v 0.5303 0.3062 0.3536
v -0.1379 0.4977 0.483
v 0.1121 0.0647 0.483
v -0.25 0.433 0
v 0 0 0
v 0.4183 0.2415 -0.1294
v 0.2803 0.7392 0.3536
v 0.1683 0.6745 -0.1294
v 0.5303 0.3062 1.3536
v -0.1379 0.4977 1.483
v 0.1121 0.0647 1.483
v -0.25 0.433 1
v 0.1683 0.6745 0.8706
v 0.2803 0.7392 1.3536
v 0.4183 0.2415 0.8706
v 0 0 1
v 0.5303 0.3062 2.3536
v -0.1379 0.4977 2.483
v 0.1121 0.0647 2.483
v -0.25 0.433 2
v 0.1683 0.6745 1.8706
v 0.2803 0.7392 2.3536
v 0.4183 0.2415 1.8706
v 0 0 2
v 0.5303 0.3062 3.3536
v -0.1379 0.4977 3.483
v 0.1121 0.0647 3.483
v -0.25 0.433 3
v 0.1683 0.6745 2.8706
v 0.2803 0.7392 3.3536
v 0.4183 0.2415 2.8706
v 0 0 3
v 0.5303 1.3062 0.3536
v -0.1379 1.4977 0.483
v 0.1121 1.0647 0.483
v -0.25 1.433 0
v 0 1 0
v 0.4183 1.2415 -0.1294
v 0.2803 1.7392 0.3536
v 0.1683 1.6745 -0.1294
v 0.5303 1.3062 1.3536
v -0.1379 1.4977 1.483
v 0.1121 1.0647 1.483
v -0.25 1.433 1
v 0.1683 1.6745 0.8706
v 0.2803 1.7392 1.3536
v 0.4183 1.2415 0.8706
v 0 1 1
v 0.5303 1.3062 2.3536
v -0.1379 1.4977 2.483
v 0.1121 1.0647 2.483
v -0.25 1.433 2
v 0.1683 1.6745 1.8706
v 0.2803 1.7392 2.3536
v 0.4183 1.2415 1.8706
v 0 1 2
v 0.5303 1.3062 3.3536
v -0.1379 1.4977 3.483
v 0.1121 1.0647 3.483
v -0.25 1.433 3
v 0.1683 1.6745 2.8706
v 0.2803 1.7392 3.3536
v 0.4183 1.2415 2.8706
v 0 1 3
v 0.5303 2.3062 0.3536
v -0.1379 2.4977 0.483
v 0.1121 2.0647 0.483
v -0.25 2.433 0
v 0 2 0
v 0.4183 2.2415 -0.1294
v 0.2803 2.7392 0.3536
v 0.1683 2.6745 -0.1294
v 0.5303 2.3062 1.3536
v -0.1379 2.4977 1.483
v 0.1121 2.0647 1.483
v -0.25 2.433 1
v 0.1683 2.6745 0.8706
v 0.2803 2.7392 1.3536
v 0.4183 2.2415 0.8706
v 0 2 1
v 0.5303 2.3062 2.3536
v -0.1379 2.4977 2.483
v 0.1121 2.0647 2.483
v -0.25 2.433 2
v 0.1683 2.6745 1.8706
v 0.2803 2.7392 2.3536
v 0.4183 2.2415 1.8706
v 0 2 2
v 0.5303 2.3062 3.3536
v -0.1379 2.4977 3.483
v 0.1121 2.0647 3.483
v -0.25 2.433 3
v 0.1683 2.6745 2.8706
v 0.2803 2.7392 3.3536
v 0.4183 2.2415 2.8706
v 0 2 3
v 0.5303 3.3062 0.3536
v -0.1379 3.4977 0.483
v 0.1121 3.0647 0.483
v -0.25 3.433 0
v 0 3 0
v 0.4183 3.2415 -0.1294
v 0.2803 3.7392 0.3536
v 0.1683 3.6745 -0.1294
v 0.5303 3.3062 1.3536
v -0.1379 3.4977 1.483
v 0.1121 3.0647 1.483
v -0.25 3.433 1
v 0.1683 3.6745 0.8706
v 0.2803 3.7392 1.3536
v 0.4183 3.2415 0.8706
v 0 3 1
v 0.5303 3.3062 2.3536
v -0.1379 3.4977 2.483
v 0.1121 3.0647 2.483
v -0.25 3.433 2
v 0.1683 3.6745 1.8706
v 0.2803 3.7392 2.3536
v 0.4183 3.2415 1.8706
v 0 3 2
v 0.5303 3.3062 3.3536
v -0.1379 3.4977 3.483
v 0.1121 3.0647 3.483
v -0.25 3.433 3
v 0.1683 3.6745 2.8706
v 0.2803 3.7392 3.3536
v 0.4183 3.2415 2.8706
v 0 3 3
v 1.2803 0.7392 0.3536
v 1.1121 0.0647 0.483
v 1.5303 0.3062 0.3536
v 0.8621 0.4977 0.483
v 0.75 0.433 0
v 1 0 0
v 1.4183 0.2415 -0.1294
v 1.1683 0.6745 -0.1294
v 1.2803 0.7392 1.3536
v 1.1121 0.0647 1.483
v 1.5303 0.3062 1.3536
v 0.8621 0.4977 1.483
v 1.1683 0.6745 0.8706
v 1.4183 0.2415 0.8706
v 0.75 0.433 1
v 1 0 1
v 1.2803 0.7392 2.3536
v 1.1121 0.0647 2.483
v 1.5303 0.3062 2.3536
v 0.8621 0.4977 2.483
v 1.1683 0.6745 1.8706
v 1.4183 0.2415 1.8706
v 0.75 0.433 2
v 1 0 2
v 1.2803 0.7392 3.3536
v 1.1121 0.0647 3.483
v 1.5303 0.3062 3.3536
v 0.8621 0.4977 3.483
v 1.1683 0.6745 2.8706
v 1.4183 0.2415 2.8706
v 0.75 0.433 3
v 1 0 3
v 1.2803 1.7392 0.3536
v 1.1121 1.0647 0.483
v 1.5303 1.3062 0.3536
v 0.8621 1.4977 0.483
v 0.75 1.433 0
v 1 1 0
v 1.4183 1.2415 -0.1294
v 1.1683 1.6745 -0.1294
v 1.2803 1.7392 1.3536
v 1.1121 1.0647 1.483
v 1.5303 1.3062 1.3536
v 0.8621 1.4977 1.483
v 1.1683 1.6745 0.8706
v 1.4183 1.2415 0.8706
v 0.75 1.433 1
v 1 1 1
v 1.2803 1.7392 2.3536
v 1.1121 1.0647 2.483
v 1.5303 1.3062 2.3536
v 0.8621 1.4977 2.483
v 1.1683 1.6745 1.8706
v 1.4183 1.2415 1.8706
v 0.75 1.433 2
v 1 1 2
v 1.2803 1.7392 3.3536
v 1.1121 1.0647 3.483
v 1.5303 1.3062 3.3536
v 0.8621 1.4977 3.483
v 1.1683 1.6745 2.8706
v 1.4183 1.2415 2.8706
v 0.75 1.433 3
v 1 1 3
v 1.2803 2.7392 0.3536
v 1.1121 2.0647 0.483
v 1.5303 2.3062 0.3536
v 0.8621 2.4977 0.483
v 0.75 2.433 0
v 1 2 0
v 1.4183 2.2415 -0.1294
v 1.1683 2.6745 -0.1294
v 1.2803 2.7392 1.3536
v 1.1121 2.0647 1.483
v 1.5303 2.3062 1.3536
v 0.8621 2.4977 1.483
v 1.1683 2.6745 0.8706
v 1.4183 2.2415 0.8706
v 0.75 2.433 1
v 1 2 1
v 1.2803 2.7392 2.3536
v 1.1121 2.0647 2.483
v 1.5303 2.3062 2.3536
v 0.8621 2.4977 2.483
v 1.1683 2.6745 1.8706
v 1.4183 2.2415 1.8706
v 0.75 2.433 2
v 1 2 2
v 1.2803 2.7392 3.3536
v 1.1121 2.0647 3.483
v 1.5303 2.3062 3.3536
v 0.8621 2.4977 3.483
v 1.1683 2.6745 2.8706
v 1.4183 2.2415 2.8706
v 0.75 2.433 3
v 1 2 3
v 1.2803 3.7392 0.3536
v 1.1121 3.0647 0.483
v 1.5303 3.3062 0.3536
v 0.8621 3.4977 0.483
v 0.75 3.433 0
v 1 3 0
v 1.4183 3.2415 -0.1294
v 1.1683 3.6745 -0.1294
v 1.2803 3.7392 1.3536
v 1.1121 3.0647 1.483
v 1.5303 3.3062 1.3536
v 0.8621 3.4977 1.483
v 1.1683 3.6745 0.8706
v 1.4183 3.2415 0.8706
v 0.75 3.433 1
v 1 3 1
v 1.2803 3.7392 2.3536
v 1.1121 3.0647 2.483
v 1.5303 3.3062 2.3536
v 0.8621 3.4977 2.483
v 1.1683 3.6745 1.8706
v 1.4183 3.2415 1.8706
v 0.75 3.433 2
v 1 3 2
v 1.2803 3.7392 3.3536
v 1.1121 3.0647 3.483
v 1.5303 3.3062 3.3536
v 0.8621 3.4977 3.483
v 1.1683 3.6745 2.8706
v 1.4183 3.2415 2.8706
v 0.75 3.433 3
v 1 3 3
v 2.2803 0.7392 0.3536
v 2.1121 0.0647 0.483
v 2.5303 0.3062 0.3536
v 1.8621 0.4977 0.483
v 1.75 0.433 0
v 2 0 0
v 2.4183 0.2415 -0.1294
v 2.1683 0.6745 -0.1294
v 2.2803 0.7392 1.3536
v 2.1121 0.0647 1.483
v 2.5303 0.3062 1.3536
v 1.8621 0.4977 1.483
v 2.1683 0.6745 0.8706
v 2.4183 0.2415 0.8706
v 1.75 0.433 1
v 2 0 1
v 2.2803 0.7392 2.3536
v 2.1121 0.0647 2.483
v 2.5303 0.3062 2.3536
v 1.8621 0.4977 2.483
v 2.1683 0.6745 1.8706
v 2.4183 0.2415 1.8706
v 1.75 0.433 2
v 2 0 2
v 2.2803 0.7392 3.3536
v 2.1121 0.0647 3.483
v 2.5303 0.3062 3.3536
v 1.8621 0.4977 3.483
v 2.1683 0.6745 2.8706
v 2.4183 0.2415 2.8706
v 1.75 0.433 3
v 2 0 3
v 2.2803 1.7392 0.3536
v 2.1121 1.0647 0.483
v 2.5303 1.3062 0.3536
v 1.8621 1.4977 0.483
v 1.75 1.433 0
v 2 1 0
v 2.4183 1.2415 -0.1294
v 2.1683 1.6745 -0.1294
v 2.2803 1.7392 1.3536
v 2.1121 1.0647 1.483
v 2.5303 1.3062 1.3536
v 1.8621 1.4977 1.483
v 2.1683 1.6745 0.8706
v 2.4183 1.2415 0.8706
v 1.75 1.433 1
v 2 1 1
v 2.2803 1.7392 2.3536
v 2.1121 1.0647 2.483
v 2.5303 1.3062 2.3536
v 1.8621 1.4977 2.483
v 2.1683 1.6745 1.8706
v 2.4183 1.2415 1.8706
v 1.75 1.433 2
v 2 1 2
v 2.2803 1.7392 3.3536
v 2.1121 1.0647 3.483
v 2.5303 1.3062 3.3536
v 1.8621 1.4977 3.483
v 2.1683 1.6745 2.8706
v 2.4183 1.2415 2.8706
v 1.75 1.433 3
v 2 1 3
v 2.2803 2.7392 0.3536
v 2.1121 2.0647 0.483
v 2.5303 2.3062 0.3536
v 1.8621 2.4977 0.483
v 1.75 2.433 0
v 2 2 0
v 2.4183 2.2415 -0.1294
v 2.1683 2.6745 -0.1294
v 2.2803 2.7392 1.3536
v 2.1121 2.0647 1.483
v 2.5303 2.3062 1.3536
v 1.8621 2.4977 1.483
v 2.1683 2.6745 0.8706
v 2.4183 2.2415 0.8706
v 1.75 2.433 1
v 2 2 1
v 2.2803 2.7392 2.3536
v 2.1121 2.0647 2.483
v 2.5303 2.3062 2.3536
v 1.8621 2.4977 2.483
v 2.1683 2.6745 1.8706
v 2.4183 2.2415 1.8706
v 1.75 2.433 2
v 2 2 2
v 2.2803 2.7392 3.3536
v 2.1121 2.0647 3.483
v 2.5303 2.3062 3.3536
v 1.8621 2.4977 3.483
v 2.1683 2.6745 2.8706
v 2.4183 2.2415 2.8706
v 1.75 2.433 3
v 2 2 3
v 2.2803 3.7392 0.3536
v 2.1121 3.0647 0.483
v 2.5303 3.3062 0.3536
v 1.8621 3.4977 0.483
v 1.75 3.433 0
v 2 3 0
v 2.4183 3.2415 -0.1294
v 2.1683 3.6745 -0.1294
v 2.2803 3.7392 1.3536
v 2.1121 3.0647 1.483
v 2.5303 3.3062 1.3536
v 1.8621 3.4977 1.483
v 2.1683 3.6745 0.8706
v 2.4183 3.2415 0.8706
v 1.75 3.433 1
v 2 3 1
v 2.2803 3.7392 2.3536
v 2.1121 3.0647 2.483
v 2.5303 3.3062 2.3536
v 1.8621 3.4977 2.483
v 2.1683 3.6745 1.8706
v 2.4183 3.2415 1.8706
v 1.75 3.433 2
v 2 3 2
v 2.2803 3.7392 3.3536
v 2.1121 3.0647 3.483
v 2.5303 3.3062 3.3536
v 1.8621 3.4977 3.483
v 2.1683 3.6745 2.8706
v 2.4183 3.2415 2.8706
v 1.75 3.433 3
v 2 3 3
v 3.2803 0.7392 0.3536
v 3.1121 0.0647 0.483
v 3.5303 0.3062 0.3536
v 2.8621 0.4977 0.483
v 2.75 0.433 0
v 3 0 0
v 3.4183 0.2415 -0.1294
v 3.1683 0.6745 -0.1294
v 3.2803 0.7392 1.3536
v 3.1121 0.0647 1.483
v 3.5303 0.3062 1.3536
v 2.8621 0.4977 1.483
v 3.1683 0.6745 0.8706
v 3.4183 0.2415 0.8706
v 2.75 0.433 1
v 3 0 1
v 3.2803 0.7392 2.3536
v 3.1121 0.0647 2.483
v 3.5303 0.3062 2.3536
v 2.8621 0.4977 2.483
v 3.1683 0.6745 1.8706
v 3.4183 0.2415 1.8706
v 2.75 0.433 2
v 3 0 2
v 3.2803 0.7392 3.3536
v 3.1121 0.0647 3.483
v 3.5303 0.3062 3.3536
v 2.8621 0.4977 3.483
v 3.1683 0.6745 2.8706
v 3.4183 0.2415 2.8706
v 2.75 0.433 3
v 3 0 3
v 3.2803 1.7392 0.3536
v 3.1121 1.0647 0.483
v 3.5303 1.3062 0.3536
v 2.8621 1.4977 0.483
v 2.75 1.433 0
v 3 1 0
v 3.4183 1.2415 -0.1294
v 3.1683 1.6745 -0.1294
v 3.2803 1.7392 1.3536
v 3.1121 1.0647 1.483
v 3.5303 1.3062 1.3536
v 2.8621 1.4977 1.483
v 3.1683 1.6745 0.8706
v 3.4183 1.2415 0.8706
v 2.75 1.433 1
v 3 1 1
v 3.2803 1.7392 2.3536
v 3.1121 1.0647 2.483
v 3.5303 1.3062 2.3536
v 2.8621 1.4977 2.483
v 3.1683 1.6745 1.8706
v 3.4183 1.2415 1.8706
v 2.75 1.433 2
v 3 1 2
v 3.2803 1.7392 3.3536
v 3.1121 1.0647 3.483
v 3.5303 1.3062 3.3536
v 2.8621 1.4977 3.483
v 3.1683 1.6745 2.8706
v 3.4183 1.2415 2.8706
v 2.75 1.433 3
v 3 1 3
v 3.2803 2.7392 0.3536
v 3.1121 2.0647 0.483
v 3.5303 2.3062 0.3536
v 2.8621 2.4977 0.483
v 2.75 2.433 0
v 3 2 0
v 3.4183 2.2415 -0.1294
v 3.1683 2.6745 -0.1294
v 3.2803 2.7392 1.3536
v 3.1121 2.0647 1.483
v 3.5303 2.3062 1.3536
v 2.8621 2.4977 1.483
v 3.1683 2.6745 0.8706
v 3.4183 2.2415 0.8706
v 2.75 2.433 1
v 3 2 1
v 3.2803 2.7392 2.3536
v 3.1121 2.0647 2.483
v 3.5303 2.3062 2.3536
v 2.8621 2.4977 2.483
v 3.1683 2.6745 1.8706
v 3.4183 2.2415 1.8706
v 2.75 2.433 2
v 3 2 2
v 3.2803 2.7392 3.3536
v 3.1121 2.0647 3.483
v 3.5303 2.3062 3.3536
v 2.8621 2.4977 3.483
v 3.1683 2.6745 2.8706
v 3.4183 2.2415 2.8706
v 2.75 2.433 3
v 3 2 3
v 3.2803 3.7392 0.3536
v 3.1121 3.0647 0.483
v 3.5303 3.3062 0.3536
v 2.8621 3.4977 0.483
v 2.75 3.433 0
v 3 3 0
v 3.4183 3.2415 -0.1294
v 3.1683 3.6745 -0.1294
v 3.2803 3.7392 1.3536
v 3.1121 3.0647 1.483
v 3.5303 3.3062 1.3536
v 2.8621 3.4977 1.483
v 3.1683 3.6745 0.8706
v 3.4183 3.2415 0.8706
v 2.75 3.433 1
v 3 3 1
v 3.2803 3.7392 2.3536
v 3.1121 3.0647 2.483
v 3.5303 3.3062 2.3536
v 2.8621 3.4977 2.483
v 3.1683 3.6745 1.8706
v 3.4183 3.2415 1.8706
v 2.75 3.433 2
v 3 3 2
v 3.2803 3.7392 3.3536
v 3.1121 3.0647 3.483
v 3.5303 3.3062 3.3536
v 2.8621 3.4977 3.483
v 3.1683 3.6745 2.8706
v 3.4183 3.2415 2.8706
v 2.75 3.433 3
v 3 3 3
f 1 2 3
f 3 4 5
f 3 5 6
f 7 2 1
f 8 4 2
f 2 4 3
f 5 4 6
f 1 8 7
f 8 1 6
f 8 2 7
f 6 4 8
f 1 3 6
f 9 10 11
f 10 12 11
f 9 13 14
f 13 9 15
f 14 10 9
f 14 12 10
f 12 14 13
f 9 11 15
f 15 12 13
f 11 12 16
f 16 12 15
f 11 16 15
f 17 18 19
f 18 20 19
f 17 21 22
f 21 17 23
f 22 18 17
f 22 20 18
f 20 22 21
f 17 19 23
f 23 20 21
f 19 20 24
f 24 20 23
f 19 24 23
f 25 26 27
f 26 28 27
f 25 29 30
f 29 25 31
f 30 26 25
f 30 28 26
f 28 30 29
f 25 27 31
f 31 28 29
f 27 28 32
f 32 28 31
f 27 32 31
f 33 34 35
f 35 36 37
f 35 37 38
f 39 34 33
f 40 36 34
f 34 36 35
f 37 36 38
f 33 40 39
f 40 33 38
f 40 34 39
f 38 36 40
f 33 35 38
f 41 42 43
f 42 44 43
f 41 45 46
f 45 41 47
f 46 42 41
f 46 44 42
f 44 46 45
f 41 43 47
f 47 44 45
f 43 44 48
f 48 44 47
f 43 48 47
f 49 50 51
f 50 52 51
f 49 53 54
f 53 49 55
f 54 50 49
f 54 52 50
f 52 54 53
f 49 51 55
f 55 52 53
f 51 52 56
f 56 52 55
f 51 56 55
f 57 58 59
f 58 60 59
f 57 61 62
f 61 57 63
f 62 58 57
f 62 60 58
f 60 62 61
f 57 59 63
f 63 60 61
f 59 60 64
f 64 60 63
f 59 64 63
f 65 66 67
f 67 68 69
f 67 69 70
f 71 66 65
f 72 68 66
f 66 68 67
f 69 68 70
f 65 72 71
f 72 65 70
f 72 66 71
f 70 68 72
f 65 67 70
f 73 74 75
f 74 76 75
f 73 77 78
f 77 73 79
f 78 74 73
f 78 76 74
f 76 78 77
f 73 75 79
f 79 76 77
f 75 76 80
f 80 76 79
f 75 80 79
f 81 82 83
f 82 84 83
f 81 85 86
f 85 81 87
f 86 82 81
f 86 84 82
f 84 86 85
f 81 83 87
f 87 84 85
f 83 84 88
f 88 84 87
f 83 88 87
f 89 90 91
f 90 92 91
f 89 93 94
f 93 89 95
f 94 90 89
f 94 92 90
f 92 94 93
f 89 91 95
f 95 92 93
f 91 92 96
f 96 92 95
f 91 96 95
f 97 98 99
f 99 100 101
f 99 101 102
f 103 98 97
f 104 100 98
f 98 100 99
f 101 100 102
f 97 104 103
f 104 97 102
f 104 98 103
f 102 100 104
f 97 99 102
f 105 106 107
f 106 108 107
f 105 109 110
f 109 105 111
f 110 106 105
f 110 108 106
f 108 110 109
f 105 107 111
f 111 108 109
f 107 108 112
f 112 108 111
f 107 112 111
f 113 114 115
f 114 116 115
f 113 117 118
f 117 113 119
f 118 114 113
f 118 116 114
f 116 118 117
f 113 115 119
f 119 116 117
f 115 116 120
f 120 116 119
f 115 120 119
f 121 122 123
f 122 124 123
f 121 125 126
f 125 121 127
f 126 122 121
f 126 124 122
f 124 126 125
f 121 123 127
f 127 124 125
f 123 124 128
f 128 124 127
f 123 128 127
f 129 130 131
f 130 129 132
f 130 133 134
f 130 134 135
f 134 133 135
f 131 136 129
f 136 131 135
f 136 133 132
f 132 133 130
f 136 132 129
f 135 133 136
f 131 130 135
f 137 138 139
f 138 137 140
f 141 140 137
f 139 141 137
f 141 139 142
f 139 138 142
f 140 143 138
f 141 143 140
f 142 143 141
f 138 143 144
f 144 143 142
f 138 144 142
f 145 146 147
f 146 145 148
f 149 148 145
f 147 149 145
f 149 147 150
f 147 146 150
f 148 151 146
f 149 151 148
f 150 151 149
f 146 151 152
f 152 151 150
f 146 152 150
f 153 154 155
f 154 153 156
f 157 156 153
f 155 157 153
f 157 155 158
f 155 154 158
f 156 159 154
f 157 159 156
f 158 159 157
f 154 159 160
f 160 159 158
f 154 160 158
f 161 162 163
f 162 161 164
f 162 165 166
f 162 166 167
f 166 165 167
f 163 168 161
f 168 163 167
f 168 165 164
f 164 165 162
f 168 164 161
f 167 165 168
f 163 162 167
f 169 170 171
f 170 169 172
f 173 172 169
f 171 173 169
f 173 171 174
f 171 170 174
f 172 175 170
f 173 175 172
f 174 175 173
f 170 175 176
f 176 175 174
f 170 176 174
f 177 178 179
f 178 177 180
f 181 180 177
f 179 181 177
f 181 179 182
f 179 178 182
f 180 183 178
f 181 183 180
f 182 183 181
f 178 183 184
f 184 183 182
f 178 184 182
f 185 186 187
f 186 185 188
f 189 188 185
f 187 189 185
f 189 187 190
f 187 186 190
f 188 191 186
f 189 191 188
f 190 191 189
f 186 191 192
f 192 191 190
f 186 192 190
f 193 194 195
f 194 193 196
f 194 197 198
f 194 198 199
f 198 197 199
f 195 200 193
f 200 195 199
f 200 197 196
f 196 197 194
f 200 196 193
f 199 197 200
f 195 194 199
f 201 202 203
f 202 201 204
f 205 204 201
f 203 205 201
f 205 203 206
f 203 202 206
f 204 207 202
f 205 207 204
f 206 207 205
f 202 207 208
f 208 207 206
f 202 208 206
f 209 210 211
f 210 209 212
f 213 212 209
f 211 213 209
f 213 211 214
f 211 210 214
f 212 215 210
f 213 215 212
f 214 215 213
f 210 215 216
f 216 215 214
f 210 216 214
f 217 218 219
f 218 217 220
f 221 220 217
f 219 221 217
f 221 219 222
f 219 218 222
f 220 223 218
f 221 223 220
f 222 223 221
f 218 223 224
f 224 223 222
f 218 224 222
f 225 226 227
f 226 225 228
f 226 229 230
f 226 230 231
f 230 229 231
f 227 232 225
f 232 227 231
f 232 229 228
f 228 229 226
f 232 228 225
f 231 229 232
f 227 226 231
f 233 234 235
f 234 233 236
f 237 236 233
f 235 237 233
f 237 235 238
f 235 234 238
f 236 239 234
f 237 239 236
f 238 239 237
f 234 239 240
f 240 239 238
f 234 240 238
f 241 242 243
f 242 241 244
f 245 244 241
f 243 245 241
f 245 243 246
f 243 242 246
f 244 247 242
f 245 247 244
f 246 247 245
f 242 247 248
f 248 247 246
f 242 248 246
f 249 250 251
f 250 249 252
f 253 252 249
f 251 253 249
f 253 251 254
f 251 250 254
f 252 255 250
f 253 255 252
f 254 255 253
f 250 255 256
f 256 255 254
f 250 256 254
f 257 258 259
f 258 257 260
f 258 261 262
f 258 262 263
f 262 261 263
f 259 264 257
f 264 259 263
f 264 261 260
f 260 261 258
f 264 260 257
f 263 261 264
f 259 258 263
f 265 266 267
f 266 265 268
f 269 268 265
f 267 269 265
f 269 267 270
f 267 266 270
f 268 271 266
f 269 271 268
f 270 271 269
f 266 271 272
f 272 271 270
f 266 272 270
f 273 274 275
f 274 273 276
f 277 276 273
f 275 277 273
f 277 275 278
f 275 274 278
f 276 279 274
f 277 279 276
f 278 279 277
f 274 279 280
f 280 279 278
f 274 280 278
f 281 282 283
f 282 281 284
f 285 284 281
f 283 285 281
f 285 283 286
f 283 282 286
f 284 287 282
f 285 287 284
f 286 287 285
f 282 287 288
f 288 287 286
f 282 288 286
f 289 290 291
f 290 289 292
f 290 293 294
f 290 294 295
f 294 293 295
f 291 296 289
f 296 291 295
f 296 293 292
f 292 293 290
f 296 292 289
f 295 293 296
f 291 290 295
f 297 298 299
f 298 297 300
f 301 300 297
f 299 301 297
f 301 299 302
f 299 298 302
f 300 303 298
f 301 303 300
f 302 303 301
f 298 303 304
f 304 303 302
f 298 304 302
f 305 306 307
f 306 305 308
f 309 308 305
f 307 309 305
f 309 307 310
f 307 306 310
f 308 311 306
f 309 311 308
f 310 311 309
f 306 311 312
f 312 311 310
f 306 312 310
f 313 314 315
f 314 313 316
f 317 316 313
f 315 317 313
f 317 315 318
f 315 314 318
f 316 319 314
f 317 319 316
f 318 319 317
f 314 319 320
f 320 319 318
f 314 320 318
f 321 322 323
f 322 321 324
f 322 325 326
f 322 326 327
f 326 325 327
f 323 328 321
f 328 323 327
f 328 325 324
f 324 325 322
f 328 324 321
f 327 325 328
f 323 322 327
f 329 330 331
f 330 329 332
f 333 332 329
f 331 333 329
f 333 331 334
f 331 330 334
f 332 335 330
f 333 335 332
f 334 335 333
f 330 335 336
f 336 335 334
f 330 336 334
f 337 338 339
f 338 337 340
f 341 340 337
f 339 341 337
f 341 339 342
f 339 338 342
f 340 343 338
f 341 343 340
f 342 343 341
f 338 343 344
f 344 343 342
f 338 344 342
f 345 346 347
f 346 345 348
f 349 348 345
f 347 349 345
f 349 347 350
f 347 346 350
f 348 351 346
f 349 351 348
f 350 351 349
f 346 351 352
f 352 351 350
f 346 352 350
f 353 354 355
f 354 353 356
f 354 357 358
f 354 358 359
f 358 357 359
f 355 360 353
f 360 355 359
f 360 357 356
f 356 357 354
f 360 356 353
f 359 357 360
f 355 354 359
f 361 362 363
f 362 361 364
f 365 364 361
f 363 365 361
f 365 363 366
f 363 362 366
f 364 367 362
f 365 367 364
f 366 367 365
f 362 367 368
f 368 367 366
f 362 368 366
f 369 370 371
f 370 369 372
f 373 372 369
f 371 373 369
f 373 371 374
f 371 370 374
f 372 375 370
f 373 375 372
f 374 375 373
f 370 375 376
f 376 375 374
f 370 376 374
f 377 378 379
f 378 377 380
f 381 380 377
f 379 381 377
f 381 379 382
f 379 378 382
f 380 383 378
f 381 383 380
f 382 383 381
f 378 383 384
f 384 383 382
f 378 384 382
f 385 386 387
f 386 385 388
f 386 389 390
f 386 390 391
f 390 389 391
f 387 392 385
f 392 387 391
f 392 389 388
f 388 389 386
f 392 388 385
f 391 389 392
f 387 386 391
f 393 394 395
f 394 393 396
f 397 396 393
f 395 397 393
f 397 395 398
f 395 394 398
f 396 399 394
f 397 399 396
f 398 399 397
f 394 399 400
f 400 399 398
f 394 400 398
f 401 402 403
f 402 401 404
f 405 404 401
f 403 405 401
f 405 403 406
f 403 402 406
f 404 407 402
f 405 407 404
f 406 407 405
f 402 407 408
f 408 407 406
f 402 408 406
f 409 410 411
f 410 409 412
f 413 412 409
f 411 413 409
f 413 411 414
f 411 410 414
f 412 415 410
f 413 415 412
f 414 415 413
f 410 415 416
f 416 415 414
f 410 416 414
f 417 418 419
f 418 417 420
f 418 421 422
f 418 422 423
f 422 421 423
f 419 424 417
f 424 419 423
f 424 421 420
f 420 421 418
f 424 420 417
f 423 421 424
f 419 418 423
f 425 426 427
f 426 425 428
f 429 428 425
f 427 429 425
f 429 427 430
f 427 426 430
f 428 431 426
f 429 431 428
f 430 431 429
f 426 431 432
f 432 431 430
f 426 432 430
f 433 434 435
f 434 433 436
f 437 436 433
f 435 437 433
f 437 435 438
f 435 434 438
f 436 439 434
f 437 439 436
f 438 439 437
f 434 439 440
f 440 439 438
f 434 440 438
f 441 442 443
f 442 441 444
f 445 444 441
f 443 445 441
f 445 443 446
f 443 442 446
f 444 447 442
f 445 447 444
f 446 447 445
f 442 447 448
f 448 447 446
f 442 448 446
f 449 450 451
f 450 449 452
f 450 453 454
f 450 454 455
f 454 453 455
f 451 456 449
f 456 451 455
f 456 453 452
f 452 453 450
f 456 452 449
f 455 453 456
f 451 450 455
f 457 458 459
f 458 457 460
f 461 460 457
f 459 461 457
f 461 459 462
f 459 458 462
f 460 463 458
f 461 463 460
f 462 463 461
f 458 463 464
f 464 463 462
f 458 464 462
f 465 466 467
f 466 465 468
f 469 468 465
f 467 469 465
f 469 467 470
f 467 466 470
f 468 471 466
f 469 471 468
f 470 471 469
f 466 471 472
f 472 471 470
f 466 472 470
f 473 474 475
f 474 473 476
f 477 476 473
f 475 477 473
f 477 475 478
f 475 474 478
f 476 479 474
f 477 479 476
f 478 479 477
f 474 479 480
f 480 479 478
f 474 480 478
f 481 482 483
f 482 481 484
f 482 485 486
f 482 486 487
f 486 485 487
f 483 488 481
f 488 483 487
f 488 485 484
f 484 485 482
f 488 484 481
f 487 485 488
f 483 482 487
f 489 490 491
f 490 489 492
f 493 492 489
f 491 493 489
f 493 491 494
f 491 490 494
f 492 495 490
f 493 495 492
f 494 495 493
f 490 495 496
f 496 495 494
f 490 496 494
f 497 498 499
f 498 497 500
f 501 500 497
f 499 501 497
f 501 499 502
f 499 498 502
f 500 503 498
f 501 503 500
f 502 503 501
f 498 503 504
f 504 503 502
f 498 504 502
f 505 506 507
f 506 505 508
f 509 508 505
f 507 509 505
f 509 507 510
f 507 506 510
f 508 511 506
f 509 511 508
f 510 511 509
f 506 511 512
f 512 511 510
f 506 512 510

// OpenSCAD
dep = 3;

for(x=[0:dep]){
    for(y=[0:dep]){
        for(z=[0:dep]){
            translate([x,y,z])
            rotate([0,15, 30])
            cube(0.5);
    
        }
    }    
}



module Logo(size=10, $fn=5) {
    // Temporary variables
    hole = size/2;
    cylinderHeight = size * 1.25;

    // One positive object (sphere) and three negative objects (cylinders)
    difference() {
        sphere(d=size);
        
        cylinder(d=hole, h=cylinderHeight, center=true);
        // The '#' operator highlights the object
        #rotate([90, 0, 0]) cylinder(d=hole, h=cylinderHeight, center=true);
        rotate([0, 90, 0]) cylinder(d=hole, h=cylinderHeight, center=true);
    }
}
